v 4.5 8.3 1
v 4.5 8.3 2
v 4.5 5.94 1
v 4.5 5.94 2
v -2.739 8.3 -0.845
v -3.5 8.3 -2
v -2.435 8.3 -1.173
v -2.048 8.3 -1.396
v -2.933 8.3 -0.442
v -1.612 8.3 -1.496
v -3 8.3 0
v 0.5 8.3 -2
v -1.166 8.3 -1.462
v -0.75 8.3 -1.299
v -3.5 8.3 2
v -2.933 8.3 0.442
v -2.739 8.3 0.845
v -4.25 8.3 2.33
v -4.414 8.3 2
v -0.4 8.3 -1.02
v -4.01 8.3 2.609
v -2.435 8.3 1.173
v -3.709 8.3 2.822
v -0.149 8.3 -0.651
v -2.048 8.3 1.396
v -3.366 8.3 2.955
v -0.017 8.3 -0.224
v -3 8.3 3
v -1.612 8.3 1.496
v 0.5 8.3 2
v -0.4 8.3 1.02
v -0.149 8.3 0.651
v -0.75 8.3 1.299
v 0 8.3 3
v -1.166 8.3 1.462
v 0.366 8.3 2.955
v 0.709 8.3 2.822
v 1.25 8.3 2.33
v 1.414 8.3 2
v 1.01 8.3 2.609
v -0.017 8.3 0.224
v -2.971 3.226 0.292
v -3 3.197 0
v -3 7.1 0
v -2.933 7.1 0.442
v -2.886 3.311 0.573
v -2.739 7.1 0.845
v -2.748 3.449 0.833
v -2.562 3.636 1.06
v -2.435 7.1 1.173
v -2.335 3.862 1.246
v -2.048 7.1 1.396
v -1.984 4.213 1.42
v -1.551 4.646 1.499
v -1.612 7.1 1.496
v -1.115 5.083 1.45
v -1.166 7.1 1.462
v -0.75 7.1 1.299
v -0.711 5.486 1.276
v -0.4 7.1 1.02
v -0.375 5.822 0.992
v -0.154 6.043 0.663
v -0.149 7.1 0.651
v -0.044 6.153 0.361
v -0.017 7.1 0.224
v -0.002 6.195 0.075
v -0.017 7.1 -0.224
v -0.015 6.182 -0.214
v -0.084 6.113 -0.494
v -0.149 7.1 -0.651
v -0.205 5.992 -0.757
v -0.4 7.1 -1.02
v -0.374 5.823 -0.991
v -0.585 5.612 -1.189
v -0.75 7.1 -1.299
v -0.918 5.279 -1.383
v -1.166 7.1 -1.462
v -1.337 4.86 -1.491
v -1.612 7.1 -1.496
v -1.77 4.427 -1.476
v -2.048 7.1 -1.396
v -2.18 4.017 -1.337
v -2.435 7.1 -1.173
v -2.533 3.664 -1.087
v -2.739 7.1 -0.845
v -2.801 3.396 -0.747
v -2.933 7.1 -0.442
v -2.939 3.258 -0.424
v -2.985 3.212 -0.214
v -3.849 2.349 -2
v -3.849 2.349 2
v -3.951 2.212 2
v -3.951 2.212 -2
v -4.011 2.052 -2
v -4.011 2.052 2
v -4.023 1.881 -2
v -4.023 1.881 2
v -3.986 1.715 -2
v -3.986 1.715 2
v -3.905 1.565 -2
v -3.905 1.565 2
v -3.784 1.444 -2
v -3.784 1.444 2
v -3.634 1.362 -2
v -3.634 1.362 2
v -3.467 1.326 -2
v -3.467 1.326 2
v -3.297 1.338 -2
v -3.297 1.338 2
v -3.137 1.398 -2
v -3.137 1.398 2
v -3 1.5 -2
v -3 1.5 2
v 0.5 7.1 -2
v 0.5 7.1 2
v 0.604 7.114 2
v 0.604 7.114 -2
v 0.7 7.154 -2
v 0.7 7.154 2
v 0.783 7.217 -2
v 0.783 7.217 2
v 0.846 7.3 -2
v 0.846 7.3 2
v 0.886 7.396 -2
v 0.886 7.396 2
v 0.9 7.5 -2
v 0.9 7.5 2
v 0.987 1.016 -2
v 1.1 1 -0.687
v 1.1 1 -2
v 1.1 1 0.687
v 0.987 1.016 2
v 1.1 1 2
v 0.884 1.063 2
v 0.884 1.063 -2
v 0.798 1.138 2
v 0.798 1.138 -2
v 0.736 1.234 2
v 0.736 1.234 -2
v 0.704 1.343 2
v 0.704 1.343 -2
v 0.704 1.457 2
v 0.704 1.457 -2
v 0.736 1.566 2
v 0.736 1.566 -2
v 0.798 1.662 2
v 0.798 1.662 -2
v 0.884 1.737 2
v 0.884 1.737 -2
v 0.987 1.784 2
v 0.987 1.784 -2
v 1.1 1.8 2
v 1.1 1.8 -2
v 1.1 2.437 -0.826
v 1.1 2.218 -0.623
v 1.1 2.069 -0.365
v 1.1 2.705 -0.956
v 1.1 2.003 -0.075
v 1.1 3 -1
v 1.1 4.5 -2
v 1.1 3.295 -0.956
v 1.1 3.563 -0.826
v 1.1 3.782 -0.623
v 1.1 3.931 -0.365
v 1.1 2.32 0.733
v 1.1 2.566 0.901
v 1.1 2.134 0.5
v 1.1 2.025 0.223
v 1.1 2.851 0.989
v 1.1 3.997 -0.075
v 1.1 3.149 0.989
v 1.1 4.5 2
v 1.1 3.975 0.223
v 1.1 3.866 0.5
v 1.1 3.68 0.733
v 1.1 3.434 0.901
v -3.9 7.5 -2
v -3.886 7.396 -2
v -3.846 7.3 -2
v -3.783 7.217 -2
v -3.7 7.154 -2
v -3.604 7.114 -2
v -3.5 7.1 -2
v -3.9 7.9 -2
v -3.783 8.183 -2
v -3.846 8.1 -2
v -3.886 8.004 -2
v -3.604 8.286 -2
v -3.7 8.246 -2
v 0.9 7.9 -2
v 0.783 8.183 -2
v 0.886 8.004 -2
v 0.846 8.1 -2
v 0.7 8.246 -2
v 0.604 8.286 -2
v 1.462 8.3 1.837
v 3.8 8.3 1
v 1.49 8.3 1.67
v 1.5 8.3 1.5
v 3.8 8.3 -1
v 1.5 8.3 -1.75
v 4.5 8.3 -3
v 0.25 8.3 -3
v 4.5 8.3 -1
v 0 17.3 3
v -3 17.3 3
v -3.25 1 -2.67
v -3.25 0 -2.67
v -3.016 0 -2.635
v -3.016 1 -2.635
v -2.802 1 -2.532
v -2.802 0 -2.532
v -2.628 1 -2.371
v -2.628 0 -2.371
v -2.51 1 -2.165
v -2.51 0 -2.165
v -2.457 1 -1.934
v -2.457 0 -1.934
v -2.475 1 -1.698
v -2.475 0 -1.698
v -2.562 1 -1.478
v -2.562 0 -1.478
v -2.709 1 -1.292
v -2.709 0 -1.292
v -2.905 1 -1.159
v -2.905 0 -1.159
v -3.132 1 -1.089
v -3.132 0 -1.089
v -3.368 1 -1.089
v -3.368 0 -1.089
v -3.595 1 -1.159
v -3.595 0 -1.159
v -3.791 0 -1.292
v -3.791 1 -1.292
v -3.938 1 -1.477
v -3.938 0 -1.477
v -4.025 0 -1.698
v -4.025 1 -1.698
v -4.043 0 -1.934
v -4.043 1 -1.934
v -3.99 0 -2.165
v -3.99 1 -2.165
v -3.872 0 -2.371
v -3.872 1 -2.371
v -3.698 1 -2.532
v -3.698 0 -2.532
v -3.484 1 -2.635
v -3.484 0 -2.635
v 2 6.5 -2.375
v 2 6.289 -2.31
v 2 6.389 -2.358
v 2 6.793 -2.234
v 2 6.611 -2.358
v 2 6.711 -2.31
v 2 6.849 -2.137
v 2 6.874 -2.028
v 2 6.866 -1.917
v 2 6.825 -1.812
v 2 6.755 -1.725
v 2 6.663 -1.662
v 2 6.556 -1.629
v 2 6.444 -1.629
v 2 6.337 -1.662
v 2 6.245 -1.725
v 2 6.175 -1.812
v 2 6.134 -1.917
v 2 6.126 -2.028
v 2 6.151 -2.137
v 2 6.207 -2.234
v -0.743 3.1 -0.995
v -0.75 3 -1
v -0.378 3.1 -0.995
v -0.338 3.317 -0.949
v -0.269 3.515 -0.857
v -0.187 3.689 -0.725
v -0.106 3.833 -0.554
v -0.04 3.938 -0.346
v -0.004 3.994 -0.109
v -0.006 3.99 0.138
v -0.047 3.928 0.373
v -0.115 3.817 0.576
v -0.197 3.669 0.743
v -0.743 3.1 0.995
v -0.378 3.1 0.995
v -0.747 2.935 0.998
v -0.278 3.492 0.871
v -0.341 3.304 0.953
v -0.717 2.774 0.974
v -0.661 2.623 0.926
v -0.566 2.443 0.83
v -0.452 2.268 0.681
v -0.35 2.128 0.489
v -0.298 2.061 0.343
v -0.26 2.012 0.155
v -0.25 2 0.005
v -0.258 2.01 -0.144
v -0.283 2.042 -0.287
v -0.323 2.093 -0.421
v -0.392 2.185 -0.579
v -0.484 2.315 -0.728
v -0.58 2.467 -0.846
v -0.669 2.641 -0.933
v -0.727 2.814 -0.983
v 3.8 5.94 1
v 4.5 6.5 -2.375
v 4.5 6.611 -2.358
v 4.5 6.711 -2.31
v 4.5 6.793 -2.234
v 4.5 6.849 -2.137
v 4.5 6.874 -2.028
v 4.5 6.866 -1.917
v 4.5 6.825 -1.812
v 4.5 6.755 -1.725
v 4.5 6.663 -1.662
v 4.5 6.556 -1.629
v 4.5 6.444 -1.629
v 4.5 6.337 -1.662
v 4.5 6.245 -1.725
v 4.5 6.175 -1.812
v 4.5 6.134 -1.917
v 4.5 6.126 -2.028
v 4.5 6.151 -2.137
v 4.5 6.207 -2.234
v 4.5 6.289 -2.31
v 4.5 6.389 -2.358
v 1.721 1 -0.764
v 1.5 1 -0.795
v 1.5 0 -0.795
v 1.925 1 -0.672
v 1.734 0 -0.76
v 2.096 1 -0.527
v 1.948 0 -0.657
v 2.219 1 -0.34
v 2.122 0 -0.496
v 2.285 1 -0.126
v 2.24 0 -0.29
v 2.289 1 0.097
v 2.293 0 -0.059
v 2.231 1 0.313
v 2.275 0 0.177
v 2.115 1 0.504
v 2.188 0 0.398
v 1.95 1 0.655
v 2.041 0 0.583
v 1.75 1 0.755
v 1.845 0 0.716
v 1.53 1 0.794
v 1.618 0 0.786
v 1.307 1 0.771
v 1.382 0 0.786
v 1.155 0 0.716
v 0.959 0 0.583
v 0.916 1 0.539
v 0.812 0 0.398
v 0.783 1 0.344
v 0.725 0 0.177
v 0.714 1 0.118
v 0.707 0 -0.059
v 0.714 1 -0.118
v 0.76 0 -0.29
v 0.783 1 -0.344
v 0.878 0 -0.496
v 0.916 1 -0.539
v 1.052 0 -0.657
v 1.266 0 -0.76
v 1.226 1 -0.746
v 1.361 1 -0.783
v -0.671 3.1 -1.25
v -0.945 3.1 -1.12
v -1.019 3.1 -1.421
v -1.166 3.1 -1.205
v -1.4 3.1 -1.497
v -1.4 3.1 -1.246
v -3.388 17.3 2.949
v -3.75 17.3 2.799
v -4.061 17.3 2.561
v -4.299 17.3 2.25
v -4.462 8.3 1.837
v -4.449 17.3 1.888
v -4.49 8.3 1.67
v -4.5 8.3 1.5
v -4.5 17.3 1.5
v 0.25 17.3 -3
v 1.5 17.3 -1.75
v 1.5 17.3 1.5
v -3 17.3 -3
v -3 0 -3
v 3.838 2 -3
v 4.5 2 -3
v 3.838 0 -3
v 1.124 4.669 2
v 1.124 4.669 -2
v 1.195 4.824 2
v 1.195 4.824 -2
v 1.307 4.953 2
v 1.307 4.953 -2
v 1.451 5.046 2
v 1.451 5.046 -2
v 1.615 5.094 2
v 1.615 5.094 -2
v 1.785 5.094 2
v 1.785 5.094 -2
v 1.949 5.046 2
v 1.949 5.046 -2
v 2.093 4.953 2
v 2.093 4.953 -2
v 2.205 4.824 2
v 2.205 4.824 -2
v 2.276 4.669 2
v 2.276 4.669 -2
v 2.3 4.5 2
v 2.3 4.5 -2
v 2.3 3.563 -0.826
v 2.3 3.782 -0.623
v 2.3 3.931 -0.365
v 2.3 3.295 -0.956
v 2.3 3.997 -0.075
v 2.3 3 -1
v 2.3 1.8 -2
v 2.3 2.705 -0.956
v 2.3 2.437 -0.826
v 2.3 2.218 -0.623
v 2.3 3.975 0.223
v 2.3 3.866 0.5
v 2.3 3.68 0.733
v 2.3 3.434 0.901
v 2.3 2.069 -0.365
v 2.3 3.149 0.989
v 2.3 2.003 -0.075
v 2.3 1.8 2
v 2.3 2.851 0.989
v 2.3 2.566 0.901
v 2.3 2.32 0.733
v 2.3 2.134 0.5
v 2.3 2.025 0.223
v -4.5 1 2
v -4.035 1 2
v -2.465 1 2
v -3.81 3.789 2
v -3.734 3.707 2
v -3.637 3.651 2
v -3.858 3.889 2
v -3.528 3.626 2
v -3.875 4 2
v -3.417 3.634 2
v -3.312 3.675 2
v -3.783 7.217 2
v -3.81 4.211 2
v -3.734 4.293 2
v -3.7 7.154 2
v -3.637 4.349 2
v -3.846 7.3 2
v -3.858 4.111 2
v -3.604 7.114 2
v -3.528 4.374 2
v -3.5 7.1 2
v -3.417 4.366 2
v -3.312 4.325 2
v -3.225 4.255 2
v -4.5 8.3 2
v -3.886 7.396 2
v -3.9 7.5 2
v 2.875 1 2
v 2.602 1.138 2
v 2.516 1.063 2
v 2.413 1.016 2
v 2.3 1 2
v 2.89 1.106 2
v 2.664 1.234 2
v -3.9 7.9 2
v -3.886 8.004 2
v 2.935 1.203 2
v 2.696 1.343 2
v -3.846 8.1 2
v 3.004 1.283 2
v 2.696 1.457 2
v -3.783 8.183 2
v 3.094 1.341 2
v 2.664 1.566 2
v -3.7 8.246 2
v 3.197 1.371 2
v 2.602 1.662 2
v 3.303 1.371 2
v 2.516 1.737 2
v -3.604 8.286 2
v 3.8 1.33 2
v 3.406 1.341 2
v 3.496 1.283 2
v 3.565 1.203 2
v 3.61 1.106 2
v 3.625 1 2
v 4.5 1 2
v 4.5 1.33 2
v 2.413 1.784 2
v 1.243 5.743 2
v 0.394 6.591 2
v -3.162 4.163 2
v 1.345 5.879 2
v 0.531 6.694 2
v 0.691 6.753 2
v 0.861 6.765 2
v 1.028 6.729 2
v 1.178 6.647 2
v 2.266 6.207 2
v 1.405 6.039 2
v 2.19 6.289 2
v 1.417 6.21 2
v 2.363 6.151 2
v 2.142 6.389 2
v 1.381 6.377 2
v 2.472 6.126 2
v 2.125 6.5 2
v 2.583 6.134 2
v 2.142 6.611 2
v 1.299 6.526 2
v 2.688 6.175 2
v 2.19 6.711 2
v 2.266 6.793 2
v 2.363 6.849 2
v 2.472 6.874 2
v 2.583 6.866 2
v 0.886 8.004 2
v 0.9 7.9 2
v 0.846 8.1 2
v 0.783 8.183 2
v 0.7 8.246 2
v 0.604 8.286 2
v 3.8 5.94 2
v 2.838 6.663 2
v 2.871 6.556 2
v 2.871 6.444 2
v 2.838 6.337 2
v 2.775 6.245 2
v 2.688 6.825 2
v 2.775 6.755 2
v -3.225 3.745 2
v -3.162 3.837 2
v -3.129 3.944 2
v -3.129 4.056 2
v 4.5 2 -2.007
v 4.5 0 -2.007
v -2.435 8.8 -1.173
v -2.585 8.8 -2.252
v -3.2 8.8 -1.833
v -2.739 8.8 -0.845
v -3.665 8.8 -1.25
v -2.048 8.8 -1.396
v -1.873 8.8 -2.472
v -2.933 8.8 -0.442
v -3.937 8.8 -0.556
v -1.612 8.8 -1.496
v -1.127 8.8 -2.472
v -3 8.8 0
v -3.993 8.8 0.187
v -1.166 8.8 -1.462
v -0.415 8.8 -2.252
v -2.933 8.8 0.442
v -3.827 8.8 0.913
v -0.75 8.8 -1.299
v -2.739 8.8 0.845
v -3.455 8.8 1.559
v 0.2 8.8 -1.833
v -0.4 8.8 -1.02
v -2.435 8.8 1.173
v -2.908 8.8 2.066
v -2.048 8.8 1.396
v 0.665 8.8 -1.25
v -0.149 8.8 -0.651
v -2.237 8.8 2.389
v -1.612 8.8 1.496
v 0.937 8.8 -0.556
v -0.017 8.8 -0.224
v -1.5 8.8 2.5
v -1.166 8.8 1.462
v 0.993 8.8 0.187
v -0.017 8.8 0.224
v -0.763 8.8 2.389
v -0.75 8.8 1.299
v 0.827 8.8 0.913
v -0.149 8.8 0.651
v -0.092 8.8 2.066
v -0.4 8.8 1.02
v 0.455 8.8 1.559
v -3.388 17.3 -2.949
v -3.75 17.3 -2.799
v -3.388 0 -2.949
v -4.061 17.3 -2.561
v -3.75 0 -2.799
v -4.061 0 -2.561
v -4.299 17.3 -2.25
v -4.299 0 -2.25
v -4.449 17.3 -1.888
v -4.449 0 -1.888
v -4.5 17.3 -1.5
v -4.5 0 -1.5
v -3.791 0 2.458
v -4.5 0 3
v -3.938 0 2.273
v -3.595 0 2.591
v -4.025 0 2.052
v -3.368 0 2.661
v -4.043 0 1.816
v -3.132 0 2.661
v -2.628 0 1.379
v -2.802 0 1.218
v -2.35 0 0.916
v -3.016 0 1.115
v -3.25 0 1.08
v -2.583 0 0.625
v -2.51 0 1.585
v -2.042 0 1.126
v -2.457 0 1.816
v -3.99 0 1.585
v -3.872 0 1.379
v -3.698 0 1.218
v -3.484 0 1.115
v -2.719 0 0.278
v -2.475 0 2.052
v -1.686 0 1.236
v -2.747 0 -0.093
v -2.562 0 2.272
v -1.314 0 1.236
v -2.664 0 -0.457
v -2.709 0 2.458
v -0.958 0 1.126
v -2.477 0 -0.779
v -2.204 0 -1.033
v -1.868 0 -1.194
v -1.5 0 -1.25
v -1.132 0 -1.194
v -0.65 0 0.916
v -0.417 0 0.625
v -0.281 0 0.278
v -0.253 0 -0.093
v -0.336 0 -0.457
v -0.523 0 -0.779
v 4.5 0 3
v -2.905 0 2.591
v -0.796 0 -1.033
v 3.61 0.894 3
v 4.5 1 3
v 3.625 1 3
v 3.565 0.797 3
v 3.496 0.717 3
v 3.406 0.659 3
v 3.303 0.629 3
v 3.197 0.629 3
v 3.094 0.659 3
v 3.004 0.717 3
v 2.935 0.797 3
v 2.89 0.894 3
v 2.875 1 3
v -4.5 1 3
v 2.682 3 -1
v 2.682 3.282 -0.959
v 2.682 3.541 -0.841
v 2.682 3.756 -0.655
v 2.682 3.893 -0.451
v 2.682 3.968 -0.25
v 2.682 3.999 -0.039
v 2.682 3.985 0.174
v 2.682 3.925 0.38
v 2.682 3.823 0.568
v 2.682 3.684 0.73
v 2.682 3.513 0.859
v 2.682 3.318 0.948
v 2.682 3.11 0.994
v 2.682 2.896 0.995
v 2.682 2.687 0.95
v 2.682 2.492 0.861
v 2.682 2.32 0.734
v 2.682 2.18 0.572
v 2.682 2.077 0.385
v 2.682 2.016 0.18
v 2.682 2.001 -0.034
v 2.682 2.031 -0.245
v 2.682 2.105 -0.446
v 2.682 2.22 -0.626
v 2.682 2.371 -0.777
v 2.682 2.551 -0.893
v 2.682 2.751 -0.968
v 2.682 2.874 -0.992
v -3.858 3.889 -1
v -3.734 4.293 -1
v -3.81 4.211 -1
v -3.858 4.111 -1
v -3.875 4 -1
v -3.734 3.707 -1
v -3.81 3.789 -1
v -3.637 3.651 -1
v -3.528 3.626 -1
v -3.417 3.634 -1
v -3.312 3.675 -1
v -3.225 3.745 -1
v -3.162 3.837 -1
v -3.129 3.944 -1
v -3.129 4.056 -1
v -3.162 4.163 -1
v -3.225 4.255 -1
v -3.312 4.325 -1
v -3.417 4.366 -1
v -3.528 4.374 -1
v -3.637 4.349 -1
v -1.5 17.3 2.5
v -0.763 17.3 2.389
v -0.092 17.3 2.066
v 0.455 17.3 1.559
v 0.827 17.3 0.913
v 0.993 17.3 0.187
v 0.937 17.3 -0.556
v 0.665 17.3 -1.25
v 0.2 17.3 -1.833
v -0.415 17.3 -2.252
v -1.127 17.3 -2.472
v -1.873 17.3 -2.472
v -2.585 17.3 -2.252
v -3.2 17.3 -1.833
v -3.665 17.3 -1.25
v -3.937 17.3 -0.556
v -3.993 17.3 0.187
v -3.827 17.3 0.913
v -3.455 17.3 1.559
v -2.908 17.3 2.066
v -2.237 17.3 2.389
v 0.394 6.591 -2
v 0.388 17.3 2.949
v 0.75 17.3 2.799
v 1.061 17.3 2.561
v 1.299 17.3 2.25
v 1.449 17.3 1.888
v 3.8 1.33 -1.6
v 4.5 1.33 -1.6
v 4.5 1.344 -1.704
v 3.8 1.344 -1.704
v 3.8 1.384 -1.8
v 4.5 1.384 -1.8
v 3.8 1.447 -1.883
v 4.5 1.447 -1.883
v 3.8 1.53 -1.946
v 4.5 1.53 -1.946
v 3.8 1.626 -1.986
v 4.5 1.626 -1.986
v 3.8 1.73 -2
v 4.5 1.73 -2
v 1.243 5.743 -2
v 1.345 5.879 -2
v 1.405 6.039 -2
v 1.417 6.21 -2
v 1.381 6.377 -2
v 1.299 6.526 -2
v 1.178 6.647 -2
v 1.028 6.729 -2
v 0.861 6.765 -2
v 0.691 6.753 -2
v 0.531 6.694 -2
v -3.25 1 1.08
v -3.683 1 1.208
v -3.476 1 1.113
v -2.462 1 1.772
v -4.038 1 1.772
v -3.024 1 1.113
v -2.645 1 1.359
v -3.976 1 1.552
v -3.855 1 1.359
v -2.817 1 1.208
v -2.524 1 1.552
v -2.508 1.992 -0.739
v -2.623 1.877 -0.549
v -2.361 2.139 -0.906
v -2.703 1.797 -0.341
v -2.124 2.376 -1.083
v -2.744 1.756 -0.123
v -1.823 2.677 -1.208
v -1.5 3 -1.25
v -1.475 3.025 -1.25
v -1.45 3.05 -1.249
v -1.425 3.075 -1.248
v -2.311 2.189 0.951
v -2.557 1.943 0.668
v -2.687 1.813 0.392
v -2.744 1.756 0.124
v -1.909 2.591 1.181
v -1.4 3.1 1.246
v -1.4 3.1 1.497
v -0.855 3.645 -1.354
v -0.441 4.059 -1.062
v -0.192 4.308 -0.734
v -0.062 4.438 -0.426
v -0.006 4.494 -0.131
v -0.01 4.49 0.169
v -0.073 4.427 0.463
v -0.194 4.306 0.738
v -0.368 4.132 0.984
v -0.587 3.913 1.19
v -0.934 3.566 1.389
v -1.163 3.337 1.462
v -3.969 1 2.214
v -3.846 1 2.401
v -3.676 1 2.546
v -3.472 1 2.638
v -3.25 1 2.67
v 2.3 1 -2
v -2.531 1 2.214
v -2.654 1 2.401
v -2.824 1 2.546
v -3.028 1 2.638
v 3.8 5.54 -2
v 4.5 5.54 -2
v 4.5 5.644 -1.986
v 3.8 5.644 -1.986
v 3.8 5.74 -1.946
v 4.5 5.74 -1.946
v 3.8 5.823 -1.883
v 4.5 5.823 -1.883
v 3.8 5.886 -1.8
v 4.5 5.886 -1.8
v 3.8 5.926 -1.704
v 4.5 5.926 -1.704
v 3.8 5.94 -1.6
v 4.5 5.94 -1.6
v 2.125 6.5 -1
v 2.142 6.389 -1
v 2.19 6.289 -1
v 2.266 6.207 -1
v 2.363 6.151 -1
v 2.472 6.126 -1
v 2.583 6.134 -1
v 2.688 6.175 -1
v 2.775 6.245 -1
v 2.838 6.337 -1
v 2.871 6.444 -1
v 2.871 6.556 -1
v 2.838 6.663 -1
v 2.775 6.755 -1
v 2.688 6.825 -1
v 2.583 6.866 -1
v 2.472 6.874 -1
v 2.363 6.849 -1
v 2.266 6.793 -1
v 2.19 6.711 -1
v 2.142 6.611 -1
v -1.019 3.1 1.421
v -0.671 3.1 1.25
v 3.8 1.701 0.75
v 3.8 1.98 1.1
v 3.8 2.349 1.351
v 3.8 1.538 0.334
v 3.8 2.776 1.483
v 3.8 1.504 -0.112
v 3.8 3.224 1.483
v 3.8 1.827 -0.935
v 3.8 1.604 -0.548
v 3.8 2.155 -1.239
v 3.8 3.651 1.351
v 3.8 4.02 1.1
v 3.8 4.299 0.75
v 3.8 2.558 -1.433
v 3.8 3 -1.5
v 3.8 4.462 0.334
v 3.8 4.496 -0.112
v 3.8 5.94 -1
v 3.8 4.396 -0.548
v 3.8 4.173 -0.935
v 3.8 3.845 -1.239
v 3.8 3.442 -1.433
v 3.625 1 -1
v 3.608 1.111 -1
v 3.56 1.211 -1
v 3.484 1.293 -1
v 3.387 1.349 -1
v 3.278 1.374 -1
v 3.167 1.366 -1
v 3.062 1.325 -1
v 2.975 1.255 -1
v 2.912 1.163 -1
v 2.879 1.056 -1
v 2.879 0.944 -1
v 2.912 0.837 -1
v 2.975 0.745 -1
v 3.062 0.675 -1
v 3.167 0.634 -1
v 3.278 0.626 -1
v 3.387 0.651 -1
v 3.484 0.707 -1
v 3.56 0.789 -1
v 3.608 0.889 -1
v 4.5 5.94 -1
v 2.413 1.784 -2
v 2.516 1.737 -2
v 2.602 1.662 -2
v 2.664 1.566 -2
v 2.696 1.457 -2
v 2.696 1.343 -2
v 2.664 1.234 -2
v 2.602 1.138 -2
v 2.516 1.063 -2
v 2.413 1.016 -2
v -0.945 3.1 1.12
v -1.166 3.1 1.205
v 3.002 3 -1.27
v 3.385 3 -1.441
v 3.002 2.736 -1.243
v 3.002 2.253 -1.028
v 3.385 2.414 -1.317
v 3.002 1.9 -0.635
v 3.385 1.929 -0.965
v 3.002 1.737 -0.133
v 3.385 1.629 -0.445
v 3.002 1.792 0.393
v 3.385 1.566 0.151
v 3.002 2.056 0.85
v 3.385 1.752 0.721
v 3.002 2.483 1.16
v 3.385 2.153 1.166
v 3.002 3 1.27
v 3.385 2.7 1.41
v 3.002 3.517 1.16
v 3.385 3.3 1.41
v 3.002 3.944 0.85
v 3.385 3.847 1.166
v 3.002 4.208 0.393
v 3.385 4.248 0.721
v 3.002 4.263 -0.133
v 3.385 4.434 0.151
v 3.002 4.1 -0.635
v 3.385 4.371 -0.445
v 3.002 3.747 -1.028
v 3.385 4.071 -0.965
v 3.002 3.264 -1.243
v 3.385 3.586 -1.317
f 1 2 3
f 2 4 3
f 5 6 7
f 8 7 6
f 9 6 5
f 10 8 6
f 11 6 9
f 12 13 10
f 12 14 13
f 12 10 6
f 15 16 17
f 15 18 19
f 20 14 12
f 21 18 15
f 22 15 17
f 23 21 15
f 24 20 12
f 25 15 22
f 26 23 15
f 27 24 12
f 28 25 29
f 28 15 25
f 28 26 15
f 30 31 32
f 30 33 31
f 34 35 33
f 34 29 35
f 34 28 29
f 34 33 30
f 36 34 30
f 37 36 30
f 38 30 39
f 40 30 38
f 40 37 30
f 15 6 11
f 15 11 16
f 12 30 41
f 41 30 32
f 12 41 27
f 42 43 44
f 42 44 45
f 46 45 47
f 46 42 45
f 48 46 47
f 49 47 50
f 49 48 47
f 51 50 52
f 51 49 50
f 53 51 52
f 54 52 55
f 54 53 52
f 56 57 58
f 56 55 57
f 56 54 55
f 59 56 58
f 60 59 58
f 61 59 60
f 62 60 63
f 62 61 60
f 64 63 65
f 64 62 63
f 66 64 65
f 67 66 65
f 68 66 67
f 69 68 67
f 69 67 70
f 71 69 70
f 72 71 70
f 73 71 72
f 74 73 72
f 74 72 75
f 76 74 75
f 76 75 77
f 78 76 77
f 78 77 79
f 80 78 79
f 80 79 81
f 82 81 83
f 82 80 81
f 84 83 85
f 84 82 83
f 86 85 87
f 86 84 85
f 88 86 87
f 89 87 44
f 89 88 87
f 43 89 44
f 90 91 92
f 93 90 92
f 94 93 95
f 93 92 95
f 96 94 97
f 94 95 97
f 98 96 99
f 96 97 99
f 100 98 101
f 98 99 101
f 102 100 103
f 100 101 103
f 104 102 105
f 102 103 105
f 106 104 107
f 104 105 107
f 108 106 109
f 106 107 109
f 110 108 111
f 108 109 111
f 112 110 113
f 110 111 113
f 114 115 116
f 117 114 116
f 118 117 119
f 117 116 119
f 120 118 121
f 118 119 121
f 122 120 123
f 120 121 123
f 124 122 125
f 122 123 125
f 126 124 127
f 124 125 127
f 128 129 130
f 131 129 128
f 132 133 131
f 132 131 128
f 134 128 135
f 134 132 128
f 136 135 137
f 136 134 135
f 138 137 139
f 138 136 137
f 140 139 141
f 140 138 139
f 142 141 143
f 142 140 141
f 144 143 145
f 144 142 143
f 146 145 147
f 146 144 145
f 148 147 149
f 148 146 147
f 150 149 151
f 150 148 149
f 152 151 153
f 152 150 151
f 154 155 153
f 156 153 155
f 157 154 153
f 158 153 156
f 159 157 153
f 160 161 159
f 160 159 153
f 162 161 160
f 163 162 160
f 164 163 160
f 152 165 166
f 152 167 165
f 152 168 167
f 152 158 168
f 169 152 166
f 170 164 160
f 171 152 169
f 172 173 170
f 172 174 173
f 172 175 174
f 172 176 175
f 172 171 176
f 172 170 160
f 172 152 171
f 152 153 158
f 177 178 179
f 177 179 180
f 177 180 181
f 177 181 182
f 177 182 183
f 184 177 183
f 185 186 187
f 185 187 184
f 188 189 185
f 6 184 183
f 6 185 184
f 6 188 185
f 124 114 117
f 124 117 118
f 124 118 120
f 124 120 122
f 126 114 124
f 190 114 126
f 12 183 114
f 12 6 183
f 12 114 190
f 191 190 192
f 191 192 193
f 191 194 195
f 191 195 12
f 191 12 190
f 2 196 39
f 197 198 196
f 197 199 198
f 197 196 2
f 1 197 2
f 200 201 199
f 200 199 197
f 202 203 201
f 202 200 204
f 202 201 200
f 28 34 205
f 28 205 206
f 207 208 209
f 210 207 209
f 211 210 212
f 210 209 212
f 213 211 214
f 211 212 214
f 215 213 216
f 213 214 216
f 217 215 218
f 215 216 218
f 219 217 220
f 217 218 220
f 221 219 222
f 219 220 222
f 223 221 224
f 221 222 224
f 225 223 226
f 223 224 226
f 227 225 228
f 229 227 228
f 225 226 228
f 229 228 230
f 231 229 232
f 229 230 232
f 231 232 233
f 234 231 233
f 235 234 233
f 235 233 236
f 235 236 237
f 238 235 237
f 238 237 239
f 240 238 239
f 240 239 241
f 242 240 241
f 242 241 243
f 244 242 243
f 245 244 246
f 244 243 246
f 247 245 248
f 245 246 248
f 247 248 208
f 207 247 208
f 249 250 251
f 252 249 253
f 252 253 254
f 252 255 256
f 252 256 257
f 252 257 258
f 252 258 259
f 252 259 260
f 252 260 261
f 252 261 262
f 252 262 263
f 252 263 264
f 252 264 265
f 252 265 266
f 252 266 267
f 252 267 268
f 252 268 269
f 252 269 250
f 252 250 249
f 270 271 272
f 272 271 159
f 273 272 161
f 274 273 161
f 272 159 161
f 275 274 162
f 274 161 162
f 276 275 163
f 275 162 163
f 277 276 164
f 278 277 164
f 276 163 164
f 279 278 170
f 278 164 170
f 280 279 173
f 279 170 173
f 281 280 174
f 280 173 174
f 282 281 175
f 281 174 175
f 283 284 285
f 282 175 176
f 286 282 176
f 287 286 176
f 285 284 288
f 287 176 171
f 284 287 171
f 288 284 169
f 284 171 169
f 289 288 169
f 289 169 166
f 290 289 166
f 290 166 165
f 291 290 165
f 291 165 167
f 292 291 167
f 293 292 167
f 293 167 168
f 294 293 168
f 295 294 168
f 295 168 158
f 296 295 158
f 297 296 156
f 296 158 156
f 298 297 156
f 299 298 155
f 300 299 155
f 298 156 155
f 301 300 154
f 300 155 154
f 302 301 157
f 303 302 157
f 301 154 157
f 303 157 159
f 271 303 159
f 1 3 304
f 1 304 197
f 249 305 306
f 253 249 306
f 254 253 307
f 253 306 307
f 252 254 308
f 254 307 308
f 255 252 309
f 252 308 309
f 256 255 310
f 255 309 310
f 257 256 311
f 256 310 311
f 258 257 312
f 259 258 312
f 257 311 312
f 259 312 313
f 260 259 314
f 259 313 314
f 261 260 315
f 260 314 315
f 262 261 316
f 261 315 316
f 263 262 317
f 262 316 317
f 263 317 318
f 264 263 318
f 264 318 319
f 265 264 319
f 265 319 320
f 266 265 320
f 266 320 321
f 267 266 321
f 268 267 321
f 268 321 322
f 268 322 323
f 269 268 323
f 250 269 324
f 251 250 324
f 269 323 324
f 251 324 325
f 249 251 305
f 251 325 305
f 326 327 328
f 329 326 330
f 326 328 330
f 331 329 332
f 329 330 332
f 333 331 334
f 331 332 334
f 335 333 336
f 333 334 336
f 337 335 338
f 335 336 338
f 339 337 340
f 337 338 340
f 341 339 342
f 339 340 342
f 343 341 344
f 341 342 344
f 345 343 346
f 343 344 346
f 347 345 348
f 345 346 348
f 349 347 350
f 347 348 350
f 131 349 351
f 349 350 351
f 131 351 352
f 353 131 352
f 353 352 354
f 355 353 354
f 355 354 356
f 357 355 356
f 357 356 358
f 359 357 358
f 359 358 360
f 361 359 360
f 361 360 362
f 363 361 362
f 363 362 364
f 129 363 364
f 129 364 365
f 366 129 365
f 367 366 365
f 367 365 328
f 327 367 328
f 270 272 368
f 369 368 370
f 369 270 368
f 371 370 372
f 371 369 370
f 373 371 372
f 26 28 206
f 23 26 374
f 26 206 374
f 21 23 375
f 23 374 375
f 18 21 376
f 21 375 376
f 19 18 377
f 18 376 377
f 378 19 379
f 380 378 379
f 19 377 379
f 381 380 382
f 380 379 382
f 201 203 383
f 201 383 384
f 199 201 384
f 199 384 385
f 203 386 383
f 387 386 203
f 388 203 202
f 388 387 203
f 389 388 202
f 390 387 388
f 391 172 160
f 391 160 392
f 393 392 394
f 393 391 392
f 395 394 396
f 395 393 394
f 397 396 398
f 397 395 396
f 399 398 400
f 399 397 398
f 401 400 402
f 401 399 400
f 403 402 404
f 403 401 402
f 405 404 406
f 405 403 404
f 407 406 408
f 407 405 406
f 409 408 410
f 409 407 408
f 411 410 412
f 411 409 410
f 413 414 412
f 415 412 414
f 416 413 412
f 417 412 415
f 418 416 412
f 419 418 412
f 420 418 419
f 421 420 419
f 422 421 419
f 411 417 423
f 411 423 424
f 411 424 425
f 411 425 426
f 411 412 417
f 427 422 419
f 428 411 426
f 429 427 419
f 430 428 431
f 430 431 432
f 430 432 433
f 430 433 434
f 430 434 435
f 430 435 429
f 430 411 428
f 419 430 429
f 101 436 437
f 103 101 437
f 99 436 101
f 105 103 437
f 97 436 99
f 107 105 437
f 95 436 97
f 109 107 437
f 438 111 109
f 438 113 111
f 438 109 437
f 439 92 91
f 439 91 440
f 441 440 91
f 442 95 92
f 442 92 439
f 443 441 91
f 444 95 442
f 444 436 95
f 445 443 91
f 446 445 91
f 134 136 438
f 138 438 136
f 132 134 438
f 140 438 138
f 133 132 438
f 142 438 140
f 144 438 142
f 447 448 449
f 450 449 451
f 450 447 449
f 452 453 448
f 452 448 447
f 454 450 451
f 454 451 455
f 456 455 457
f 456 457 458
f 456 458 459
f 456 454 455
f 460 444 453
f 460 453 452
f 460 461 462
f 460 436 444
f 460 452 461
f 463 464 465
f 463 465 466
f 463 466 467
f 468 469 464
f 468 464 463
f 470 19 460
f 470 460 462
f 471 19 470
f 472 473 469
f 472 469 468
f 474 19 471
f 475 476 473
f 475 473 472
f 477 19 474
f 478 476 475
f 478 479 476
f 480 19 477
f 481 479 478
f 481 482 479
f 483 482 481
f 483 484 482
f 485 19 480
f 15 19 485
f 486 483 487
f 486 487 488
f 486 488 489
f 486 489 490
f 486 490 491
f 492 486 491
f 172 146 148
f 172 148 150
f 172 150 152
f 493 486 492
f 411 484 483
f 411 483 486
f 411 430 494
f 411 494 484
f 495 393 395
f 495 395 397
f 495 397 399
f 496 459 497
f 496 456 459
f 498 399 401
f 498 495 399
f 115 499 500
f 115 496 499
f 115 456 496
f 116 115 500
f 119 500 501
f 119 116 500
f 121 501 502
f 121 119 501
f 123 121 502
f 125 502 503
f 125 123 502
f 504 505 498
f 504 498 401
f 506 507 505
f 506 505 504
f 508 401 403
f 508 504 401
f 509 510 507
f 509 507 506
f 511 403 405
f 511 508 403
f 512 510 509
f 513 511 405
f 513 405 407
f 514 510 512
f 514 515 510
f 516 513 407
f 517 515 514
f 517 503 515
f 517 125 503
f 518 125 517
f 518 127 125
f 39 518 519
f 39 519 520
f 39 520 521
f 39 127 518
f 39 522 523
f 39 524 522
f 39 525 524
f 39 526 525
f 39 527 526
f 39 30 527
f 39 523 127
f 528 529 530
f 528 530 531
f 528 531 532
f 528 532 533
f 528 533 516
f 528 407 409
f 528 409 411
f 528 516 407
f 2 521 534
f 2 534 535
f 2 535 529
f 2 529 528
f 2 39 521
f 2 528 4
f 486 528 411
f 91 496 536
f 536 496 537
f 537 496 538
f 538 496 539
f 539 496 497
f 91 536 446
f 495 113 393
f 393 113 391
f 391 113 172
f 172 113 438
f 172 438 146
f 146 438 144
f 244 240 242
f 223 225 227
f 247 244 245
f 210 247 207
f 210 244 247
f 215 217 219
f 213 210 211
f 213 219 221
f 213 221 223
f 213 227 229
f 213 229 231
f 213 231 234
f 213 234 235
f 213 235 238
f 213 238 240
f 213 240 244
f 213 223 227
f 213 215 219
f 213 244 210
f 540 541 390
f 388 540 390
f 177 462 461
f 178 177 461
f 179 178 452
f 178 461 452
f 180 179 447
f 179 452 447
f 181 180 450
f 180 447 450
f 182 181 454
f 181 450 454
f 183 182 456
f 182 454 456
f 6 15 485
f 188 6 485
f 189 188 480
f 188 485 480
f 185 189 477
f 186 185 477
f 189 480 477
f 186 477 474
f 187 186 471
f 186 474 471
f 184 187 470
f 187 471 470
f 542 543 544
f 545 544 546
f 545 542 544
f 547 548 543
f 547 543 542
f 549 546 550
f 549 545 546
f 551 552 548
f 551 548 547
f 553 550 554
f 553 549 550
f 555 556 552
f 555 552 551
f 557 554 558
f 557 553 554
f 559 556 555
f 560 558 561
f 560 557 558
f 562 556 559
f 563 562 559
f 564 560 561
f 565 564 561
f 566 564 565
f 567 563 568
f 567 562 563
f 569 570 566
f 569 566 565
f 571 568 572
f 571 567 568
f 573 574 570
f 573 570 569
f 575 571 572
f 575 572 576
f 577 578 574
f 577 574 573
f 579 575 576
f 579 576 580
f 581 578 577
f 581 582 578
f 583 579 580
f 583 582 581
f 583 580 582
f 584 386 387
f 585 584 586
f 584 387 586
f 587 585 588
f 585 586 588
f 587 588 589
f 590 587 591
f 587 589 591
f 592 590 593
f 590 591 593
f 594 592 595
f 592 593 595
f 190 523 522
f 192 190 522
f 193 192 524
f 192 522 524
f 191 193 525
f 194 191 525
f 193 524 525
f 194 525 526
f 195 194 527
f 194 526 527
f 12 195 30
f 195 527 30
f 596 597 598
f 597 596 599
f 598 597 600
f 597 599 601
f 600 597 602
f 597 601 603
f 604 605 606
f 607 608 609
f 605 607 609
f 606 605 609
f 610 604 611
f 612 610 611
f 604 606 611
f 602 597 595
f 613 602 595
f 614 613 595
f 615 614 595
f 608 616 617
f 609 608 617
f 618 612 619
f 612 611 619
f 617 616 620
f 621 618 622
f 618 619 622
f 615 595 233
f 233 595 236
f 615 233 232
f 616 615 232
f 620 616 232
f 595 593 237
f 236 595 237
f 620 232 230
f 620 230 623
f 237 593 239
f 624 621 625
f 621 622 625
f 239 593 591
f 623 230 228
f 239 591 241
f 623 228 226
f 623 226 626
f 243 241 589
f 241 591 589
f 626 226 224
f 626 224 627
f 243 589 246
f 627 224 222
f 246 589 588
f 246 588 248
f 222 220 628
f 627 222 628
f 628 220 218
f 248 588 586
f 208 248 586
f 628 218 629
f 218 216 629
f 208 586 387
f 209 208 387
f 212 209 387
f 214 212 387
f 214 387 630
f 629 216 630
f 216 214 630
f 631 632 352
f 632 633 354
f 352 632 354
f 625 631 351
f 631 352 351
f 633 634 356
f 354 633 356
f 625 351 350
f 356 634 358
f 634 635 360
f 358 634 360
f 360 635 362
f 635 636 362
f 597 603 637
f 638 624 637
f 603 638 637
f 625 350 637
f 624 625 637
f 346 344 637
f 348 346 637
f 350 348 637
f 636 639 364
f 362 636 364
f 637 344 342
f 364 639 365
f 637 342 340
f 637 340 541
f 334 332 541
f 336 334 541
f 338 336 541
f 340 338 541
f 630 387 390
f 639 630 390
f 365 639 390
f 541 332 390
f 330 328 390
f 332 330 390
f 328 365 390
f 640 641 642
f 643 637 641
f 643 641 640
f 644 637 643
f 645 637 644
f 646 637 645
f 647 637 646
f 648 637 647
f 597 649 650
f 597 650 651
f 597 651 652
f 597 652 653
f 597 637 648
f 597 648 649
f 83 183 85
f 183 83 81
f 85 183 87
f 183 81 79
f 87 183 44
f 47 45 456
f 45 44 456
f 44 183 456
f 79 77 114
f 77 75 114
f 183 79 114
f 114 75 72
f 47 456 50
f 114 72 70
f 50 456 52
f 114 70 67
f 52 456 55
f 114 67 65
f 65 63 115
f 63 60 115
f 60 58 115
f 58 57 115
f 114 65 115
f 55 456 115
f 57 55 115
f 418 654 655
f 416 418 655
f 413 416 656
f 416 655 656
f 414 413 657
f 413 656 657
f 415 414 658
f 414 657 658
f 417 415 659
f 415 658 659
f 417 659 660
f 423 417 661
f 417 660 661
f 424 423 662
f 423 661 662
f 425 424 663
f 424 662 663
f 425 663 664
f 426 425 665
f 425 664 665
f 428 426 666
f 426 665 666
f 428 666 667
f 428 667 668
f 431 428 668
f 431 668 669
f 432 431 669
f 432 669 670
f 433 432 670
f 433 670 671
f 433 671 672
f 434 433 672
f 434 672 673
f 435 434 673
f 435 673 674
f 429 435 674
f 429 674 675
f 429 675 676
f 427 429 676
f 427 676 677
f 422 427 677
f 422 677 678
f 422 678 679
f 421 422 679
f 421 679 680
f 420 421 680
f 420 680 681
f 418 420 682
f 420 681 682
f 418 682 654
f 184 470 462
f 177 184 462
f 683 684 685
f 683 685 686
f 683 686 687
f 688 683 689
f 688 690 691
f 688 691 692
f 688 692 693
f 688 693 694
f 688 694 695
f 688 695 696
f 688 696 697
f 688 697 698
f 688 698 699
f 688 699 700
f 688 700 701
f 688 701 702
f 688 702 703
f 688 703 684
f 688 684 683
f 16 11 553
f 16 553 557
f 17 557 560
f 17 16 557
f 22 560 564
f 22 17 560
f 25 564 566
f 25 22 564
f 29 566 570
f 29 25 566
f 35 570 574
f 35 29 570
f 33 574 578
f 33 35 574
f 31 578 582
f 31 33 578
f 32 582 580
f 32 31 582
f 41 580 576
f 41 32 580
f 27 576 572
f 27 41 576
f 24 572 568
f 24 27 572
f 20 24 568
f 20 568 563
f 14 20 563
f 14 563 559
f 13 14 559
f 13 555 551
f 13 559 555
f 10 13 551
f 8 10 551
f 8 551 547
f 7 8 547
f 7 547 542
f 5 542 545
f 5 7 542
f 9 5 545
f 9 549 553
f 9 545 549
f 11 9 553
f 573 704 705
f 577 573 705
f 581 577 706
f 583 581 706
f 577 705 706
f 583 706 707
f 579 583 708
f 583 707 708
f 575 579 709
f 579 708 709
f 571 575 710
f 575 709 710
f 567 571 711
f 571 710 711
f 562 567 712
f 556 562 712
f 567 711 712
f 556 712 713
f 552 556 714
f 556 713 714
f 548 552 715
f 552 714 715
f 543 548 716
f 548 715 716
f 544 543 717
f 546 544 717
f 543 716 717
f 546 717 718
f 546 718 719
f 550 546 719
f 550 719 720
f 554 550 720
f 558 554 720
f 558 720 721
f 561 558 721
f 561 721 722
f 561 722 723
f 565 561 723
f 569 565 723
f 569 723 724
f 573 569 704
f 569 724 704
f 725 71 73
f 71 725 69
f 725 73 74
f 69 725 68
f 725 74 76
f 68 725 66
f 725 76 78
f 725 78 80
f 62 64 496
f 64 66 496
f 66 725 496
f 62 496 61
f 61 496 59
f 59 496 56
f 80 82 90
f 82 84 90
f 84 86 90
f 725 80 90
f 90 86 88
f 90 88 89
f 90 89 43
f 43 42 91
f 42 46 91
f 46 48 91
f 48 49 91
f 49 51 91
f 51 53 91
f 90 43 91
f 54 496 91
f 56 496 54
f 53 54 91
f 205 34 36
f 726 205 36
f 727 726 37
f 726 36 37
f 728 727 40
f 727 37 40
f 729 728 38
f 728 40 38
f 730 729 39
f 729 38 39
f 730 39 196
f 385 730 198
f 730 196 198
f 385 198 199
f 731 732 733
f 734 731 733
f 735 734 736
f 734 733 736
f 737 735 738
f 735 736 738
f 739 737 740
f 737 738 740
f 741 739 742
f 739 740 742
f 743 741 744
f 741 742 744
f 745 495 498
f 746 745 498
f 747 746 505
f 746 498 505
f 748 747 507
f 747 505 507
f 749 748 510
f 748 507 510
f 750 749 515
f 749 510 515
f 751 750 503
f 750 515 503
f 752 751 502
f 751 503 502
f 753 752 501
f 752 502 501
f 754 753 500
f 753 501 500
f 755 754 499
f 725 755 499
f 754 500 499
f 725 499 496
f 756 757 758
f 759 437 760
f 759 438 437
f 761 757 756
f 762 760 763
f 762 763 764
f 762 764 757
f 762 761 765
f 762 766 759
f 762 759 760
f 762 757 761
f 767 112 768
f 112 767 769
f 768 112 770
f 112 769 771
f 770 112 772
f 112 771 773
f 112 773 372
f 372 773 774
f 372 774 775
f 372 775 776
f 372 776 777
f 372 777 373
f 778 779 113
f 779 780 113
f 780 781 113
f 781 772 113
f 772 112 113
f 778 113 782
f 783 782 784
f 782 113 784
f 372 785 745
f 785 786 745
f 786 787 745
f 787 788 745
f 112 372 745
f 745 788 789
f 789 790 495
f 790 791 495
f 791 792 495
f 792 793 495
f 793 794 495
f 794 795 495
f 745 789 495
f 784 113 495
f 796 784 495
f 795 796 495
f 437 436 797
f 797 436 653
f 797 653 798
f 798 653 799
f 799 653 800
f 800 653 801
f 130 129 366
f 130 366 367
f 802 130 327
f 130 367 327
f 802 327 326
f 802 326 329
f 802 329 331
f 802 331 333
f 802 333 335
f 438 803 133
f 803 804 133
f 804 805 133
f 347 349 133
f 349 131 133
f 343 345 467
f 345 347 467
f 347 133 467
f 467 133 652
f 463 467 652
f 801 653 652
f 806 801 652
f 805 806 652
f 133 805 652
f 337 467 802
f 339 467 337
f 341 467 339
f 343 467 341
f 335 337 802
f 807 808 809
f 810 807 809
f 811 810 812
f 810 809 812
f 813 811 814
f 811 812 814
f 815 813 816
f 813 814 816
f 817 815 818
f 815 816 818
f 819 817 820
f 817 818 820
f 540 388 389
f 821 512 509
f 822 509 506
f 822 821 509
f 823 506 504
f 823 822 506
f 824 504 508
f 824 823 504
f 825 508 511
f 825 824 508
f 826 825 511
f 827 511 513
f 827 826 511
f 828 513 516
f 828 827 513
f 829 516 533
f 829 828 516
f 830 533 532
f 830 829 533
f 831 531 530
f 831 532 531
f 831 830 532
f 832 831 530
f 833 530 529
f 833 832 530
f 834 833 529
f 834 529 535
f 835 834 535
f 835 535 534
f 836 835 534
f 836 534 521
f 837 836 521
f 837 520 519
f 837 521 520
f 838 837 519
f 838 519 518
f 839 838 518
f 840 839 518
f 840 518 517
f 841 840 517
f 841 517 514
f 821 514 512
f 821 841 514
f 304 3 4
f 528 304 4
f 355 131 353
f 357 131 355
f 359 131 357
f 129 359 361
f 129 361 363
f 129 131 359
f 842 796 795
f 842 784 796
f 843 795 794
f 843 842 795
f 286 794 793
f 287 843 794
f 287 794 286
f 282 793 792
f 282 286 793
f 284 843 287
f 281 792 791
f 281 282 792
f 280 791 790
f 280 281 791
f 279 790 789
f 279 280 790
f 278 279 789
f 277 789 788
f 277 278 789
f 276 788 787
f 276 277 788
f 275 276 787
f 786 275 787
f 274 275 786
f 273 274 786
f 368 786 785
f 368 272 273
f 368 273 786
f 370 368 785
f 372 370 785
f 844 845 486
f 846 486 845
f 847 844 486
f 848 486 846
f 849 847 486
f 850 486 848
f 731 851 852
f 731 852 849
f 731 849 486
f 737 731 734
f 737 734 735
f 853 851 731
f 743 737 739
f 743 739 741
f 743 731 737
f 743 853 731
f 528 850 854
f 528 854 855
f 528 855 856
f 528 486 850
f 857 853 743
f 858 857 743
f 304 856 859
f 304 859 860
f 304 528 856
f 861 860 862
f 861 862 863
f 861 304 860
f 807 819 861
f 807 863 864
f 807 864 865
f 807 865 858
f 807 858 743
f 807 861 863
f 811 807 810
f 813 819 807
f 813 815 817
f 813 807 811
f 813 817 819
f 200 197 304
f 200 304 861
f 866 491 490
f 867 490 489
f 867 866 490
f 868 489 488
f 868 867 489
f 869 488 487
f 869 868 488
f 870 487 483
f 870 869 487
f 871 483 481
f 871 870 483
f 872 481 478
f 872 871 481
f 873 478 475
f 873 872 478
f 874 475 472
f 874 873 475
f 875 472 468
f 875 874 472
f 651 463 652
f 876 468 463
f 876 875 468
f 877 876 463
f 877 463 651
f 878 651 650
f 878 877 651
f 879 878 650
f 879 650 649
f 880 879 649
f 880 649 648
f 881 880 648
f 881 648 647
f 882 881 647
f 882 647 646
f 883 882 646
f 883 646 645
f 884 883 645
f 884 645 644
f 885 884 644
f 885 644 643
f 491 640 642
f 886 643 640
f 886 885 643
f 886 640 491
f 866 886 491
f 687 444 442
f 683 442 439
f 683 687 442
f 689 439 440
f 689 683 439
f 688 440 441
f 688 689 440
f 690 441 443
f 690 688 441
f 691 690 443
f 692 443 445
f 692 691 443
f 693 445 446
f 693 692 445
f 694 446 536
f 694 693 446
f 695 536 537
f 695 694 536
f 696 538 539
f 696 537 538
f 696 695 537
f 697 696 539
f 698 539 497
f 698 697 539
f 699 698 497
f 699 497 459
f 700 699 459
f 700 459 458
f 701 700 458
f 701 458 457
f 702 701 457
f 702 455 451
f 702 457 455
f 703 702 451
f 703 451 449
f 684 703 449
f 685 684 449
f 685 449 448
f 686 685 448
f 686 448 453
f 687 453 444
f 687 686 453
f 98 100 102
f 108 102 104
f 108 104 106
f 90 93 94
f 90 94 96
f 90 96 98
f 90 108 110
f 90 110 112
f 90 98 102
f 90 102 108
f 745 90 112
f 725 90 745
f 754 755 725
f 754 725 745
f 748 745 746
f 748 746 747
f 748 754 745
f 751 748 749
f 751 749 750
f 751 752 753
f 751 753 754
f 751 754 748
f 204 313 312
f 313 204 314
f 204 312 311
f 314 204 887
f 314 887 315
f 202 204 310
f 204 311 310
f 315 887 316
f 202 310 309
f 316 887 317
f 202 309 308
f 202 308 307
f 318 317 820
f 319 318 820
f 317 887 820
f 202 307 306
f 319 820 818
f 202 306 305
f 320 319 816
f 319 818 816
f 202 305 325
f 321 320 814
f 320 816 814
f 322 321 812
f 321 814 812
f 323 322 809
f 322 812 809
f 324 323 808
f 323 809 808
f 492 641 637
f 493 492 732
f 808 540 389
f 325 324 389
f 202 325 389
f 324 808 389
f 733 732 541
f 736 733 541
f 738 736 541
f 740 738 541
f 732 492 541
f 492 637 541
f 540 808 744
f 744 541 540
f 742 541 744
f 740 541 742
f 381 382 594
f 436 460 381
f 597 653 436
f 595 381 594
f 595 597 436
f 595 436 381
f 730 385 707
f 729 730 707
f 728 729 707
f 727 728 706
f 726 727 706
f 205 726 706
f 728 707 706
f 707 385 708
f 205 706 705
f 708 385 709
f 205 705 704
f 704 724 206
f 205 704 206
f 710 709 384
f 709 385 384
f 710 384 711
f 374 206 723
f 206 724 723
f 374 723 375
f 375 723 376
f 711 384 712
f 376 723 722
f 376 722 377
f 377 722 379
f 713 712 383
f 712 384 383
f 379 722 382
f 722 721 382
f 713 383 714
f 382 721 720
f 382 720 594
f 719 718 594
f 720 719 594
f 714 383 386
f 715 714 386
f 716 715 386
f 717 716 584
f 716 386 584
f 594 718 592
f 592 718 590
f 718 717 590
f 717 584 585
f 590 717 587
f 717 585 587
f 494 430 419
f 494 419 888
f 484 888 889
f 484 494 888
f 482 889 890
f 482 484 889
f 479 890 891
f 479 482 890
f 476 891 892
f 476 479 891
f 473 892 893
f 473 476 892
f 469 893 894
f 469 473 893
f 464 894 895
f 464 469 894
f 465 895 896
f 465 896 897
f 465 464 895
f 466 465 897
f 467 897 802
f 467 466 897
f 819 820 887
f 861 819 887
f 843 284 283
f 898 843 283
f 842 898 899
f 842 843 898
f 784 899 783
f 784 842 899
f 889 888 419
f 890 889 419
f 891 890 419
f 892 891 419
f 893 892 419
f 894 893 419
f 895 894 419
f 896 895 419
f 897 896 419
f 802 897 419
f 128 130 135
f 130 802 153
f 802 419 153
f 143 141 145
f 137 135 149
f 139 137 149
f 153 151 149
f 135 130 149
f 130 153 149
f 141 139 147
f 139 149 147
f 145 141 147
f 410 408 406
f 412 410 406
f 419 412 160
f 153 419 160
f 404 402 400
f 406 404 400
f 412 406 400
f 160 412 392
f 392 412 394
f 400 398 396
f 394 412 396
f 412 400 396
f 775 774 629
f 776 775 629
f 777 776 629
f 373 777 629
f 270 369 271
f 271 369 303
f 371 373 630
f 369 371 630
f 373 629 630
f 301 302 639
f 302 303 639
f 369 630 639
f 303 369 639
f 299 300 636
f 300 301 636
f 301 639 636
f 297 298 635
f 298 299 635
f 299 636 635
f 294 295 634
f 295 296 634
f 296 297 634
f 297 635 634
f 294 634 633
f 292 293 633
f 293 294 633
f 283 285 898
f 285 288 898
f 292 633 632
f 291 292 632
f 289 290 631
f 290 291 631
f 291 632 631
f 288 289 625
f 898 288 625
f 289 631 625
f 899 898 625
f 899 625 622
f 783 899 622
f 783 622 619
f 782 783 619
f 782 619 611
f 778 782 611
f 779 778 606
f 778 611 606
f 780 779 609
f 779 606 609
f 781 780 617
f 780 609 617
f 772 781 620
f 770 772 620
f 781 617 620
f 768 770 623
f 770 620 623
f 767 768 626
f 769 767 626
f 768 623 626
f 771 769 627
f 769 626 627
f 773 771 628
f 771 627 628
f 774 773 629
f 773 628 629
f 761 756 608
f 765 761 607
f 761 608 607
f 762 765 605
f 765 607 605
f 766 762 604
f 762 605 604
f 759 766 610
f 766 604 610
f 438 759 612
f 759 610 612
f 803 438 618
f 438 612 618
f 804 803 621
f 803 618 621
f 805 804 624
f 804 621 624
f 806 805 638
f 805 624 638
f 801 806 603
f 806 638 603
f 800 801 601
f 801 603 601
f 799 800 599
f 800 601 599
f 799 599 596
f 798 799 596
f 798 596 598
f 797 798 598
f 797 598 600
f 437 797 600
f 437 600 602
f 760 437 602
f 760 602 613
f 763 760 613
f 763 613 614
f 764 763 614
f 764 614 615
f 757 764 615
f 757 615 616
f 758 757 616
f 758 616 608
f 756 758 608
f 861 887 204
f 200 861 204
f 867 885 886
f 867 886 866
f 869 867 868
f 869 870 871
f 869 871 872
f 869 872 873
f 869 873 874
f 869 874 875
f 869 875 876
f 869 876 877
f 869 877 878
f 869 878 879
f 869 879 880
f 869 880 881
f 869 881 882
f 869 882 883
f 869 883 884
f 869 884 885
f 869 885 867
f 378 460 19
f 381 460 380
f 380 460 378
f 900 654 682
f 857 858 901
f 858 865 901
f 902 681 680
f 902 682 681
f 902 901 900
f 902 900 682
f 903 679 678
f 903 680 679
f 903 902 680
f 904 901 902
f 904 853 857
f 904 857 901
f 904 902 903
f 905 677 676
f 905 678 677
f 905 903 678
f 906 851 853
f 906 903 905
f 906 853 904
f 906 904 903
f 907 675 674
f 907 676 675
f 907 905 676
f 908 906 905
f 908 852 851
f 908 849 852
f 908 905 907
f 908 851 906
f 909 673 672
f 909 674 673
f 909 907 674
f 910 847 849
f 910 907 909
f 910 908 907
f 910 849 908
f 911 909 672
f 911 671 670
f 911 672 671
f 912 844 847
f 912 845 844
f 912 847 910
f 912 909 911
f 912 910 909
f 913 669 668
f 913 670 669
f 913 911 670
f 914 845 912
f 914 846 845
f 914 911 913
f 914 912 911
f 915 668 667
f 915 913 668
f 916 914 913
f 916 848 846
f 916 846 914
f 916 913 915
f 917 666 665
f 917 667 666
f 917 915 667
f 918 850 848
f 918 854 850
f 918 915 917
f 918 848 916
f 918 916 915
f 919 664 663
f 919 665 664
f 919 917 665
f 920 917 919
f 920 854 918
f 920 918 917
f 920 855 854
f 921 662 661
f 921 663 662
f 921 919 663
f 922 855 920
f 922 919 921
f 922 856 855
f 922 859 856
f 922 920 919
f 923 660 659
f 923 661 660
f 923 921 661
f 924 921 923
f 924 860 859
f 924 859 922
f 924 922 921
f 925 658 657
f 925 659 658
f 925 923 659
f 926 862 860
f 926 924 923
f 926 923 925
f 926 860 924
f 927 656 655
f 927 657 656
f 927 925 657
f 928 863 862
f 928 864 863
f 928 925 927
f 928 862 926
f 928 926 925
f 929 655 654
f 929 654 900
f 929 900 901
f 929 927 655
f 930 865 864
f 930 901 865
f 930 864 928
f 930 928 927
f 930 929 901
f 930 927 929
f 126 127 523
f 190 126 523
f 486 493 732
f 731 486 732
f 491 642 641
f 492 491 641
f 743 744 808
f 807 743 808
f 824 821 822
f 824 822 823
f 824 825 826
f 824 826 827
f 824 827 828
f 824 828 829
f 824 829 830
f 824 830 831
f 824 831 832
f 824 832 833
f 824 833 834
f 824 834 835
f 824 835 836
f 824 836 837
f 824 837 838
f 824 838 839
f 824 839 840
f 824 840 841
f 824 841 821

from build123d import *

# Parameters (mm, degrees)
SKETCH1_W                   = 9
SKETCH1_H                   = 6
MAIN_BODY_EXT_DEPTH         = 8.3
EMISSION_PATH_EXT_DEPTH     = 9
SKETCH3_R                   = 1.25
EMISSION_AND_GRIN_CUT_DEPTH = 19.125672401
SKETCH4_R                   = 1
DRUM_LENS_CUT_DEPTH         = 7
SKETCH5_W                   = 9
SKETCH5_H                   = 7.3
FILTERSET_CUT1_DEPTH        = 1
FILTERSET_CUT2_DEPTH        = 4
SKETCH10_R                  = 2.5
EMISSION_LENS_CUT_DEPTH     = 8.5
SKETCH15_R                  = 0.795
MAGNETS_CUT_DEPTH           = 1
SCREW_HOLES_CUT_DEPTH       = 19.561788707
SCREW_HOLES_CUT_DEPTH_BACK  = 3
SKETCH18_R                  = 0.375
EXTERNAL_FILLET_1_R         = 1.5
CUT_EXTRUDE8_DEPTH          = 12.545128843
CUT_EXTRUDE8_DEPTH_BACK     = 4
SKETCH28_R                  = 1.5
CUT_EXTRUDE9_DEPTH          = 2
CUT_EXTRUDE10_DEPTH         = 0.7
SKETCH29_R                  = 0.375
CUT_EXTRUDE11_DEPTH         = 2.5
SKETCH32_W                  = 2
SKETCH32_H                  = 2.36
CUT_EXTRUDE14_DEPTH         = 0.7
CUT_EXTRUDE16_DEPTH         = 9


with BuildPart() as part:
    # Sketch1 → Main Body Ext (new body)
    with BuildSketch(Plane(origin=(0, 0, 0), x_dir=(1, 0, 0), z_dir=(0, 1, 0))):
        Rectangle(SKETCH1_W, SKETCH1_H)
    extrude(amount=MAIN_BODY_EXT_DEPTH)

    # Sketch8 → Emission Path Ext (add)
    with BuildSketch(Plane(origin=(0, 8.3, 0), x_dir=(1, 0, 0), z_dir=(0, 1, 0))):
        Polygon((0.25, 3), (1.5, 1.75), (1.5, -3), (-4.5, -3), (-4.5, 3), align=None)
    extrude(amount=EMISSION_PATH_EXT_DEPTH)

    # Sketch3 → Emission and Grin Cut (cut, through all)
    with BuildSketch(Plane.XZ):
        with Locations(Location((-1.5, 0, 0), (0, 0, 270))):
            Circle(SKETCH3_R)
    extrude(amount=-EMISSION_AND_GRIN_CUT_DEPTH, mode=Mode.SUBTRACT)

    # Sketch4 → Drum Lens Cut (cut)
    with BuildSketch(Plane(origin=(4.5, 0, 0), x_dir=(0, 0, -1), z_dir=(1, 0, 0))):
        with Locations((0, 3)):
            Circle(SKETCH4_R)
    extrude(amount=-DRUM_LENS_CUT_DEPTH, mode=Mode.SUBTRACT)

    # Sketch5 → FilterSet Cut1 (cut)
    with BuildSketch(Plane.XY.offset(3)):
        with Locations((0, 4.65)):
            Rectangle(SKETCH5_W, SKETCH5_H)
    extrude(amount=-FILTERSET_CUT1_DEPTH, mode=Mode.SUBTRACT)

    # Sketch6 → FilterSet Cut2 (cut)
    with BuildSketch(Plane.XY.offset(2)):
        with BuildLine():
            Line((2.3, 4.5), (2.3, 1.8))
            ThreePointArc((2.3, 1.8), (2.7, 1.4), (2.3, 1))
            Line((2.3, 1), (1.1, 1))
            ThreePointArc((1.1, 1), (0.7, 1.4), (1.1, 1.8))
            Line((1.1, 1.8), (1.1, 4.5))
            ThreePointArc((1.1, 4.5), (1.7, 5.1), (2.3, 4.5))
        make_face()
        with BuildLine():
            Line((-3.9, 7.9), (-3.9, 7.5))
            ThreePointArc((-3.9, 7.5), (-3.782842712, 7.217157288), (-3.5, 7.1))
            Line((-3.5, 7.1), (0.5, 7.1))
            ThreePointArc((0.5, 7.1), (0.782842712, 7.217157288), (0.9, 7.5))
            Line((0.9, 7.5), (0.9, 7.9))
            ThreePointArc((0.9, 7.9), (0.782842712, 8.182842712), (0.5, 8.3))
            Line((0.5, 8.3), (-3.5, 8.3))
            ThreePointArc((-3.5, 8.3), (-3.782842712, 8.182842712), (-3.9, 7.9))
        make_face()
        with BuildLine():
            Line((0.39411255, 6.591168825), (-3.848528137, 2.348528137))
            ThreePointArc((-3.848528137, 2.348528137), (-3.848528137, 1.5), (-3, 1.5))
            Line((-3, 1.5), (1.242640687, 5.742640687))
            ThreePointArc((1.242640687, 5.742640687), (1.242640687, 6.591168825), (0.39411255, 6.591168825))
        make_face()
    extrude(amount=-FILTERSET_CUT2_DEPTH, mode=Mode.SUBTRACT)

    # Sketch10 → Emission Lens Cut (cut)
    with BuildSketch(Plane(origin=(0, 17.3, 0), x_dir=(1, 0, 0), z_dir=(0, 1, 0))):
        with Locations(Location((-1.5, 0, 0), (0, 0, 270))):
            Circle(SKETCH10_R)
    extrude(amount=-EMISSION_LENS_CUT_DEPTH, mode=Mode.SUBTRACT)

    # Sketch15 → Magnets Cut (cut)
    with BuildSketch(Plane.XZ):
        with Locations(Location((-3.25, -1.875, 0), (0, 0, 270))):
            Circle(SKETCH15_R)
        with Locations(Location((-3.25, 1.875, 0), (0, 0, 270))):
            Circle(SKETCH15_R)
        with Locations(Location((1.5, 0, 0), (0, 0, 270))):
            Circle(SKETCH15_R)
    extrude(amount=-MAGNETS_CUT_DEPTH, mode=Mode.SUBTRACT)

    # Sketch18 → Screw Holes Cut (cut, two sides: drawn at the far end of the back side and taken through both)
    with BuildSketch(Plane.XY.offset(2).offset(-SCREW_HOLES_CUT_DEPTH_BACK)):
        with Locations(Location((-3.5, 4, 0), (0, 0, 180))):
            Circle(SKETCH18_R)
        with Locations(Location((2.5, 6.5, 0), (0, 0, 180))):
            Circle(SKETCH18_R)
        with Locations((3.25, 1)):
            Circle(SKETCH18_R)
    extrude(amount=SCREW_HOLES_CUT_DEPTH + SCREW_HOLES_CUT_DEPTH_BACK, mode=Mode.SUBTRACT)

    # External Fillet 1
    # the kernel refuses this fillet: 1.5 mm, written as the material it takes off along each edge
    with BuildSketch(Plane(origin=(-4.5, -3.75, -3), x_dir=(1, 0, 0), z_dir=(0, 1, 0))) as external_fillet_1_piece_1:
        with BuildLine():
            CenterArc((EXTERNAL_FILLET_1_R, -EXTERNAL_FILLET_1_R), EXTERNAL_FILLET_1_R, 90, 90)
            Line((0, -EXTERNAL_FILLET_1_R), (0, 0))
            Line((0, 0), (EXTERNAL_FILLET_1_R, 0))
        make_face()
    extrude(amount=24.8, mode=Mode.SUBTRACT)
    with BuildSketch(Plane(origin=(1.5, 8.3, 3), x_dir=(0, 0, -1), z_dir=(0, 1, 0))) as external_fillet_1_piece_2:
        with BuildLine():
            CenterArc((EXTERNAL_FILLET_1_R, EXTERNAL_FILLET_1_R), EXTERNAL_FILLET_1_R, 180, 90)
            Line((0, EXTERNAL_FILLET_1_R), (0, 0))
            Line((0, 0), (EXTERNAL_FILLET_1_R, 0))
        make_face()
    extrude(amount=12.75, mode=Mode.SUBTRACT)

    # Sketch28 → Cut-Extrude8 (cut, two sides: drawn at the far end of the back side and taken through both)
    with BuildSketch(Plane(origin=(0, 7.1, 0), x_dir=(1, 0, 0), z_dir=(0, 1, 0)).offset(-CUT_EXTRUDE8_DEPTH_BACK)):
        with Locations(Location((-1.5, 0, 0), (0, 0, 180))):
            Circle(SKETCH28_R)
    extrude(amount=CUT_EXTRUDE8_DEPTH + CUT_EXTRUDE8_DEPTH_BACK, mode=Mode.SUBTRACT)

    # Sketch14 → Cut-Extrude9 (cut)
    with BuildSketch(Plane.XZ):
        Polygon((4.5, -3), (4.5, -2.006698359), (3.837798906, -3), align=None)
    extrude(amount=-CUT_EXTRUDE9_DEPTH, mode=Mode.SUBTRACT)

    # Sketch12 → Cut-Extrude10 (cut)
    with BuildSketch(Plane(origin=(4.5, 0, 0), x_dir=(0, 0, -1), z_dir=(1, 0, 0))):
        with BuildLine():
            Line((1.6, 5.94), (-1.6, 5.94))
            Line((-1.6, 5.94), (-2, 5.94))
            Line((-2, 5.94), (-2, 1.33))
            Line((-2, 1.33), (1.6, 1.33))
            ThreePointArc((1.6, 1.33), (1.882842712, 1.447157288), (2, 1.73))
            Line((2, 1.73), (2, 5.54))
            ThreePointArc((2, 5.54), (1.882842712, 5.822842712), (1.6, 5.94))
        make_face()
    extrude(amount=-CUT_EXTRUDE10_DEPTH, mode=Mode.SUBTRACT)

    # Sketch29 → Cut-Extrude11 (cut)
    with BuildSketch(Plane(origin=(4.5, 0, 0), x_dir=(0, 0, -1), z_dir=(1, 0, 0))):
        with Locations((2, 6.5)):
            Circle(SKETCH29_R)
    extrude(amount=-CUT_EXTRUDE11_DEPTH, mode=Mode.SUBTRACT)

    # Sketch32 → Cut-Extrude14 (cut)
    with BuildSketch(Plane(origin=(4.5, 0, 0), x_dir=(0, 0, -1), z_dir=(1, 0, 0))):
        with Locations((0, 7.12)):
            Rectangle(SKETCH32_W, SKETCH32_H)
    extrude(amount=-CUT_EXTRUDE14_DEPTH, mode=Mode.SUBTRACT)

    # Sketch33 → Cut-Revolve1 (revolve, cut)
    with BuildSketch(Plane.XY, mode=Mode.PRIVATE) as cut_revolve1_sk:
        with BuildLine():
            Line((3.8, 3), (2.3, 3))
            ThreePointArc((2.3, 3), (2.739339828, 4.060660172), (3.8, 4.5))
            Line((3.8, 4.5), (3.8, 3))
        make_face()
    revolve(cut_revolve1_sk.sketch.rotate(Axis((3.8, 3, 0), (-1, 0, 0)), 90), axis=Axis((3.8, 3, 0), (-1, 0, 0)), mode=Mode.SUBTRACT)

    # Sketch36 → Cut-Extrude16 (cut)
    with BuildSketch(Plane(origin=(0, 17.3, 0), x_dir=(1, 0, 0), z_dir=(0, 1, 0))):
        with BuildLine():
            Line((-4.5, -1.5), (-4.5, -3))
            Line((-4.5, -3), (-3, -3))
            ThreePointArc((-3, -3), (-4.060660172, -2.560660172), (-4.5, -1.5))
        make_face()
    extrude(amount=-CUT_EXTRUDE16_DEPTH, mode=Mode.SUBTRACT)


solid = part.part
